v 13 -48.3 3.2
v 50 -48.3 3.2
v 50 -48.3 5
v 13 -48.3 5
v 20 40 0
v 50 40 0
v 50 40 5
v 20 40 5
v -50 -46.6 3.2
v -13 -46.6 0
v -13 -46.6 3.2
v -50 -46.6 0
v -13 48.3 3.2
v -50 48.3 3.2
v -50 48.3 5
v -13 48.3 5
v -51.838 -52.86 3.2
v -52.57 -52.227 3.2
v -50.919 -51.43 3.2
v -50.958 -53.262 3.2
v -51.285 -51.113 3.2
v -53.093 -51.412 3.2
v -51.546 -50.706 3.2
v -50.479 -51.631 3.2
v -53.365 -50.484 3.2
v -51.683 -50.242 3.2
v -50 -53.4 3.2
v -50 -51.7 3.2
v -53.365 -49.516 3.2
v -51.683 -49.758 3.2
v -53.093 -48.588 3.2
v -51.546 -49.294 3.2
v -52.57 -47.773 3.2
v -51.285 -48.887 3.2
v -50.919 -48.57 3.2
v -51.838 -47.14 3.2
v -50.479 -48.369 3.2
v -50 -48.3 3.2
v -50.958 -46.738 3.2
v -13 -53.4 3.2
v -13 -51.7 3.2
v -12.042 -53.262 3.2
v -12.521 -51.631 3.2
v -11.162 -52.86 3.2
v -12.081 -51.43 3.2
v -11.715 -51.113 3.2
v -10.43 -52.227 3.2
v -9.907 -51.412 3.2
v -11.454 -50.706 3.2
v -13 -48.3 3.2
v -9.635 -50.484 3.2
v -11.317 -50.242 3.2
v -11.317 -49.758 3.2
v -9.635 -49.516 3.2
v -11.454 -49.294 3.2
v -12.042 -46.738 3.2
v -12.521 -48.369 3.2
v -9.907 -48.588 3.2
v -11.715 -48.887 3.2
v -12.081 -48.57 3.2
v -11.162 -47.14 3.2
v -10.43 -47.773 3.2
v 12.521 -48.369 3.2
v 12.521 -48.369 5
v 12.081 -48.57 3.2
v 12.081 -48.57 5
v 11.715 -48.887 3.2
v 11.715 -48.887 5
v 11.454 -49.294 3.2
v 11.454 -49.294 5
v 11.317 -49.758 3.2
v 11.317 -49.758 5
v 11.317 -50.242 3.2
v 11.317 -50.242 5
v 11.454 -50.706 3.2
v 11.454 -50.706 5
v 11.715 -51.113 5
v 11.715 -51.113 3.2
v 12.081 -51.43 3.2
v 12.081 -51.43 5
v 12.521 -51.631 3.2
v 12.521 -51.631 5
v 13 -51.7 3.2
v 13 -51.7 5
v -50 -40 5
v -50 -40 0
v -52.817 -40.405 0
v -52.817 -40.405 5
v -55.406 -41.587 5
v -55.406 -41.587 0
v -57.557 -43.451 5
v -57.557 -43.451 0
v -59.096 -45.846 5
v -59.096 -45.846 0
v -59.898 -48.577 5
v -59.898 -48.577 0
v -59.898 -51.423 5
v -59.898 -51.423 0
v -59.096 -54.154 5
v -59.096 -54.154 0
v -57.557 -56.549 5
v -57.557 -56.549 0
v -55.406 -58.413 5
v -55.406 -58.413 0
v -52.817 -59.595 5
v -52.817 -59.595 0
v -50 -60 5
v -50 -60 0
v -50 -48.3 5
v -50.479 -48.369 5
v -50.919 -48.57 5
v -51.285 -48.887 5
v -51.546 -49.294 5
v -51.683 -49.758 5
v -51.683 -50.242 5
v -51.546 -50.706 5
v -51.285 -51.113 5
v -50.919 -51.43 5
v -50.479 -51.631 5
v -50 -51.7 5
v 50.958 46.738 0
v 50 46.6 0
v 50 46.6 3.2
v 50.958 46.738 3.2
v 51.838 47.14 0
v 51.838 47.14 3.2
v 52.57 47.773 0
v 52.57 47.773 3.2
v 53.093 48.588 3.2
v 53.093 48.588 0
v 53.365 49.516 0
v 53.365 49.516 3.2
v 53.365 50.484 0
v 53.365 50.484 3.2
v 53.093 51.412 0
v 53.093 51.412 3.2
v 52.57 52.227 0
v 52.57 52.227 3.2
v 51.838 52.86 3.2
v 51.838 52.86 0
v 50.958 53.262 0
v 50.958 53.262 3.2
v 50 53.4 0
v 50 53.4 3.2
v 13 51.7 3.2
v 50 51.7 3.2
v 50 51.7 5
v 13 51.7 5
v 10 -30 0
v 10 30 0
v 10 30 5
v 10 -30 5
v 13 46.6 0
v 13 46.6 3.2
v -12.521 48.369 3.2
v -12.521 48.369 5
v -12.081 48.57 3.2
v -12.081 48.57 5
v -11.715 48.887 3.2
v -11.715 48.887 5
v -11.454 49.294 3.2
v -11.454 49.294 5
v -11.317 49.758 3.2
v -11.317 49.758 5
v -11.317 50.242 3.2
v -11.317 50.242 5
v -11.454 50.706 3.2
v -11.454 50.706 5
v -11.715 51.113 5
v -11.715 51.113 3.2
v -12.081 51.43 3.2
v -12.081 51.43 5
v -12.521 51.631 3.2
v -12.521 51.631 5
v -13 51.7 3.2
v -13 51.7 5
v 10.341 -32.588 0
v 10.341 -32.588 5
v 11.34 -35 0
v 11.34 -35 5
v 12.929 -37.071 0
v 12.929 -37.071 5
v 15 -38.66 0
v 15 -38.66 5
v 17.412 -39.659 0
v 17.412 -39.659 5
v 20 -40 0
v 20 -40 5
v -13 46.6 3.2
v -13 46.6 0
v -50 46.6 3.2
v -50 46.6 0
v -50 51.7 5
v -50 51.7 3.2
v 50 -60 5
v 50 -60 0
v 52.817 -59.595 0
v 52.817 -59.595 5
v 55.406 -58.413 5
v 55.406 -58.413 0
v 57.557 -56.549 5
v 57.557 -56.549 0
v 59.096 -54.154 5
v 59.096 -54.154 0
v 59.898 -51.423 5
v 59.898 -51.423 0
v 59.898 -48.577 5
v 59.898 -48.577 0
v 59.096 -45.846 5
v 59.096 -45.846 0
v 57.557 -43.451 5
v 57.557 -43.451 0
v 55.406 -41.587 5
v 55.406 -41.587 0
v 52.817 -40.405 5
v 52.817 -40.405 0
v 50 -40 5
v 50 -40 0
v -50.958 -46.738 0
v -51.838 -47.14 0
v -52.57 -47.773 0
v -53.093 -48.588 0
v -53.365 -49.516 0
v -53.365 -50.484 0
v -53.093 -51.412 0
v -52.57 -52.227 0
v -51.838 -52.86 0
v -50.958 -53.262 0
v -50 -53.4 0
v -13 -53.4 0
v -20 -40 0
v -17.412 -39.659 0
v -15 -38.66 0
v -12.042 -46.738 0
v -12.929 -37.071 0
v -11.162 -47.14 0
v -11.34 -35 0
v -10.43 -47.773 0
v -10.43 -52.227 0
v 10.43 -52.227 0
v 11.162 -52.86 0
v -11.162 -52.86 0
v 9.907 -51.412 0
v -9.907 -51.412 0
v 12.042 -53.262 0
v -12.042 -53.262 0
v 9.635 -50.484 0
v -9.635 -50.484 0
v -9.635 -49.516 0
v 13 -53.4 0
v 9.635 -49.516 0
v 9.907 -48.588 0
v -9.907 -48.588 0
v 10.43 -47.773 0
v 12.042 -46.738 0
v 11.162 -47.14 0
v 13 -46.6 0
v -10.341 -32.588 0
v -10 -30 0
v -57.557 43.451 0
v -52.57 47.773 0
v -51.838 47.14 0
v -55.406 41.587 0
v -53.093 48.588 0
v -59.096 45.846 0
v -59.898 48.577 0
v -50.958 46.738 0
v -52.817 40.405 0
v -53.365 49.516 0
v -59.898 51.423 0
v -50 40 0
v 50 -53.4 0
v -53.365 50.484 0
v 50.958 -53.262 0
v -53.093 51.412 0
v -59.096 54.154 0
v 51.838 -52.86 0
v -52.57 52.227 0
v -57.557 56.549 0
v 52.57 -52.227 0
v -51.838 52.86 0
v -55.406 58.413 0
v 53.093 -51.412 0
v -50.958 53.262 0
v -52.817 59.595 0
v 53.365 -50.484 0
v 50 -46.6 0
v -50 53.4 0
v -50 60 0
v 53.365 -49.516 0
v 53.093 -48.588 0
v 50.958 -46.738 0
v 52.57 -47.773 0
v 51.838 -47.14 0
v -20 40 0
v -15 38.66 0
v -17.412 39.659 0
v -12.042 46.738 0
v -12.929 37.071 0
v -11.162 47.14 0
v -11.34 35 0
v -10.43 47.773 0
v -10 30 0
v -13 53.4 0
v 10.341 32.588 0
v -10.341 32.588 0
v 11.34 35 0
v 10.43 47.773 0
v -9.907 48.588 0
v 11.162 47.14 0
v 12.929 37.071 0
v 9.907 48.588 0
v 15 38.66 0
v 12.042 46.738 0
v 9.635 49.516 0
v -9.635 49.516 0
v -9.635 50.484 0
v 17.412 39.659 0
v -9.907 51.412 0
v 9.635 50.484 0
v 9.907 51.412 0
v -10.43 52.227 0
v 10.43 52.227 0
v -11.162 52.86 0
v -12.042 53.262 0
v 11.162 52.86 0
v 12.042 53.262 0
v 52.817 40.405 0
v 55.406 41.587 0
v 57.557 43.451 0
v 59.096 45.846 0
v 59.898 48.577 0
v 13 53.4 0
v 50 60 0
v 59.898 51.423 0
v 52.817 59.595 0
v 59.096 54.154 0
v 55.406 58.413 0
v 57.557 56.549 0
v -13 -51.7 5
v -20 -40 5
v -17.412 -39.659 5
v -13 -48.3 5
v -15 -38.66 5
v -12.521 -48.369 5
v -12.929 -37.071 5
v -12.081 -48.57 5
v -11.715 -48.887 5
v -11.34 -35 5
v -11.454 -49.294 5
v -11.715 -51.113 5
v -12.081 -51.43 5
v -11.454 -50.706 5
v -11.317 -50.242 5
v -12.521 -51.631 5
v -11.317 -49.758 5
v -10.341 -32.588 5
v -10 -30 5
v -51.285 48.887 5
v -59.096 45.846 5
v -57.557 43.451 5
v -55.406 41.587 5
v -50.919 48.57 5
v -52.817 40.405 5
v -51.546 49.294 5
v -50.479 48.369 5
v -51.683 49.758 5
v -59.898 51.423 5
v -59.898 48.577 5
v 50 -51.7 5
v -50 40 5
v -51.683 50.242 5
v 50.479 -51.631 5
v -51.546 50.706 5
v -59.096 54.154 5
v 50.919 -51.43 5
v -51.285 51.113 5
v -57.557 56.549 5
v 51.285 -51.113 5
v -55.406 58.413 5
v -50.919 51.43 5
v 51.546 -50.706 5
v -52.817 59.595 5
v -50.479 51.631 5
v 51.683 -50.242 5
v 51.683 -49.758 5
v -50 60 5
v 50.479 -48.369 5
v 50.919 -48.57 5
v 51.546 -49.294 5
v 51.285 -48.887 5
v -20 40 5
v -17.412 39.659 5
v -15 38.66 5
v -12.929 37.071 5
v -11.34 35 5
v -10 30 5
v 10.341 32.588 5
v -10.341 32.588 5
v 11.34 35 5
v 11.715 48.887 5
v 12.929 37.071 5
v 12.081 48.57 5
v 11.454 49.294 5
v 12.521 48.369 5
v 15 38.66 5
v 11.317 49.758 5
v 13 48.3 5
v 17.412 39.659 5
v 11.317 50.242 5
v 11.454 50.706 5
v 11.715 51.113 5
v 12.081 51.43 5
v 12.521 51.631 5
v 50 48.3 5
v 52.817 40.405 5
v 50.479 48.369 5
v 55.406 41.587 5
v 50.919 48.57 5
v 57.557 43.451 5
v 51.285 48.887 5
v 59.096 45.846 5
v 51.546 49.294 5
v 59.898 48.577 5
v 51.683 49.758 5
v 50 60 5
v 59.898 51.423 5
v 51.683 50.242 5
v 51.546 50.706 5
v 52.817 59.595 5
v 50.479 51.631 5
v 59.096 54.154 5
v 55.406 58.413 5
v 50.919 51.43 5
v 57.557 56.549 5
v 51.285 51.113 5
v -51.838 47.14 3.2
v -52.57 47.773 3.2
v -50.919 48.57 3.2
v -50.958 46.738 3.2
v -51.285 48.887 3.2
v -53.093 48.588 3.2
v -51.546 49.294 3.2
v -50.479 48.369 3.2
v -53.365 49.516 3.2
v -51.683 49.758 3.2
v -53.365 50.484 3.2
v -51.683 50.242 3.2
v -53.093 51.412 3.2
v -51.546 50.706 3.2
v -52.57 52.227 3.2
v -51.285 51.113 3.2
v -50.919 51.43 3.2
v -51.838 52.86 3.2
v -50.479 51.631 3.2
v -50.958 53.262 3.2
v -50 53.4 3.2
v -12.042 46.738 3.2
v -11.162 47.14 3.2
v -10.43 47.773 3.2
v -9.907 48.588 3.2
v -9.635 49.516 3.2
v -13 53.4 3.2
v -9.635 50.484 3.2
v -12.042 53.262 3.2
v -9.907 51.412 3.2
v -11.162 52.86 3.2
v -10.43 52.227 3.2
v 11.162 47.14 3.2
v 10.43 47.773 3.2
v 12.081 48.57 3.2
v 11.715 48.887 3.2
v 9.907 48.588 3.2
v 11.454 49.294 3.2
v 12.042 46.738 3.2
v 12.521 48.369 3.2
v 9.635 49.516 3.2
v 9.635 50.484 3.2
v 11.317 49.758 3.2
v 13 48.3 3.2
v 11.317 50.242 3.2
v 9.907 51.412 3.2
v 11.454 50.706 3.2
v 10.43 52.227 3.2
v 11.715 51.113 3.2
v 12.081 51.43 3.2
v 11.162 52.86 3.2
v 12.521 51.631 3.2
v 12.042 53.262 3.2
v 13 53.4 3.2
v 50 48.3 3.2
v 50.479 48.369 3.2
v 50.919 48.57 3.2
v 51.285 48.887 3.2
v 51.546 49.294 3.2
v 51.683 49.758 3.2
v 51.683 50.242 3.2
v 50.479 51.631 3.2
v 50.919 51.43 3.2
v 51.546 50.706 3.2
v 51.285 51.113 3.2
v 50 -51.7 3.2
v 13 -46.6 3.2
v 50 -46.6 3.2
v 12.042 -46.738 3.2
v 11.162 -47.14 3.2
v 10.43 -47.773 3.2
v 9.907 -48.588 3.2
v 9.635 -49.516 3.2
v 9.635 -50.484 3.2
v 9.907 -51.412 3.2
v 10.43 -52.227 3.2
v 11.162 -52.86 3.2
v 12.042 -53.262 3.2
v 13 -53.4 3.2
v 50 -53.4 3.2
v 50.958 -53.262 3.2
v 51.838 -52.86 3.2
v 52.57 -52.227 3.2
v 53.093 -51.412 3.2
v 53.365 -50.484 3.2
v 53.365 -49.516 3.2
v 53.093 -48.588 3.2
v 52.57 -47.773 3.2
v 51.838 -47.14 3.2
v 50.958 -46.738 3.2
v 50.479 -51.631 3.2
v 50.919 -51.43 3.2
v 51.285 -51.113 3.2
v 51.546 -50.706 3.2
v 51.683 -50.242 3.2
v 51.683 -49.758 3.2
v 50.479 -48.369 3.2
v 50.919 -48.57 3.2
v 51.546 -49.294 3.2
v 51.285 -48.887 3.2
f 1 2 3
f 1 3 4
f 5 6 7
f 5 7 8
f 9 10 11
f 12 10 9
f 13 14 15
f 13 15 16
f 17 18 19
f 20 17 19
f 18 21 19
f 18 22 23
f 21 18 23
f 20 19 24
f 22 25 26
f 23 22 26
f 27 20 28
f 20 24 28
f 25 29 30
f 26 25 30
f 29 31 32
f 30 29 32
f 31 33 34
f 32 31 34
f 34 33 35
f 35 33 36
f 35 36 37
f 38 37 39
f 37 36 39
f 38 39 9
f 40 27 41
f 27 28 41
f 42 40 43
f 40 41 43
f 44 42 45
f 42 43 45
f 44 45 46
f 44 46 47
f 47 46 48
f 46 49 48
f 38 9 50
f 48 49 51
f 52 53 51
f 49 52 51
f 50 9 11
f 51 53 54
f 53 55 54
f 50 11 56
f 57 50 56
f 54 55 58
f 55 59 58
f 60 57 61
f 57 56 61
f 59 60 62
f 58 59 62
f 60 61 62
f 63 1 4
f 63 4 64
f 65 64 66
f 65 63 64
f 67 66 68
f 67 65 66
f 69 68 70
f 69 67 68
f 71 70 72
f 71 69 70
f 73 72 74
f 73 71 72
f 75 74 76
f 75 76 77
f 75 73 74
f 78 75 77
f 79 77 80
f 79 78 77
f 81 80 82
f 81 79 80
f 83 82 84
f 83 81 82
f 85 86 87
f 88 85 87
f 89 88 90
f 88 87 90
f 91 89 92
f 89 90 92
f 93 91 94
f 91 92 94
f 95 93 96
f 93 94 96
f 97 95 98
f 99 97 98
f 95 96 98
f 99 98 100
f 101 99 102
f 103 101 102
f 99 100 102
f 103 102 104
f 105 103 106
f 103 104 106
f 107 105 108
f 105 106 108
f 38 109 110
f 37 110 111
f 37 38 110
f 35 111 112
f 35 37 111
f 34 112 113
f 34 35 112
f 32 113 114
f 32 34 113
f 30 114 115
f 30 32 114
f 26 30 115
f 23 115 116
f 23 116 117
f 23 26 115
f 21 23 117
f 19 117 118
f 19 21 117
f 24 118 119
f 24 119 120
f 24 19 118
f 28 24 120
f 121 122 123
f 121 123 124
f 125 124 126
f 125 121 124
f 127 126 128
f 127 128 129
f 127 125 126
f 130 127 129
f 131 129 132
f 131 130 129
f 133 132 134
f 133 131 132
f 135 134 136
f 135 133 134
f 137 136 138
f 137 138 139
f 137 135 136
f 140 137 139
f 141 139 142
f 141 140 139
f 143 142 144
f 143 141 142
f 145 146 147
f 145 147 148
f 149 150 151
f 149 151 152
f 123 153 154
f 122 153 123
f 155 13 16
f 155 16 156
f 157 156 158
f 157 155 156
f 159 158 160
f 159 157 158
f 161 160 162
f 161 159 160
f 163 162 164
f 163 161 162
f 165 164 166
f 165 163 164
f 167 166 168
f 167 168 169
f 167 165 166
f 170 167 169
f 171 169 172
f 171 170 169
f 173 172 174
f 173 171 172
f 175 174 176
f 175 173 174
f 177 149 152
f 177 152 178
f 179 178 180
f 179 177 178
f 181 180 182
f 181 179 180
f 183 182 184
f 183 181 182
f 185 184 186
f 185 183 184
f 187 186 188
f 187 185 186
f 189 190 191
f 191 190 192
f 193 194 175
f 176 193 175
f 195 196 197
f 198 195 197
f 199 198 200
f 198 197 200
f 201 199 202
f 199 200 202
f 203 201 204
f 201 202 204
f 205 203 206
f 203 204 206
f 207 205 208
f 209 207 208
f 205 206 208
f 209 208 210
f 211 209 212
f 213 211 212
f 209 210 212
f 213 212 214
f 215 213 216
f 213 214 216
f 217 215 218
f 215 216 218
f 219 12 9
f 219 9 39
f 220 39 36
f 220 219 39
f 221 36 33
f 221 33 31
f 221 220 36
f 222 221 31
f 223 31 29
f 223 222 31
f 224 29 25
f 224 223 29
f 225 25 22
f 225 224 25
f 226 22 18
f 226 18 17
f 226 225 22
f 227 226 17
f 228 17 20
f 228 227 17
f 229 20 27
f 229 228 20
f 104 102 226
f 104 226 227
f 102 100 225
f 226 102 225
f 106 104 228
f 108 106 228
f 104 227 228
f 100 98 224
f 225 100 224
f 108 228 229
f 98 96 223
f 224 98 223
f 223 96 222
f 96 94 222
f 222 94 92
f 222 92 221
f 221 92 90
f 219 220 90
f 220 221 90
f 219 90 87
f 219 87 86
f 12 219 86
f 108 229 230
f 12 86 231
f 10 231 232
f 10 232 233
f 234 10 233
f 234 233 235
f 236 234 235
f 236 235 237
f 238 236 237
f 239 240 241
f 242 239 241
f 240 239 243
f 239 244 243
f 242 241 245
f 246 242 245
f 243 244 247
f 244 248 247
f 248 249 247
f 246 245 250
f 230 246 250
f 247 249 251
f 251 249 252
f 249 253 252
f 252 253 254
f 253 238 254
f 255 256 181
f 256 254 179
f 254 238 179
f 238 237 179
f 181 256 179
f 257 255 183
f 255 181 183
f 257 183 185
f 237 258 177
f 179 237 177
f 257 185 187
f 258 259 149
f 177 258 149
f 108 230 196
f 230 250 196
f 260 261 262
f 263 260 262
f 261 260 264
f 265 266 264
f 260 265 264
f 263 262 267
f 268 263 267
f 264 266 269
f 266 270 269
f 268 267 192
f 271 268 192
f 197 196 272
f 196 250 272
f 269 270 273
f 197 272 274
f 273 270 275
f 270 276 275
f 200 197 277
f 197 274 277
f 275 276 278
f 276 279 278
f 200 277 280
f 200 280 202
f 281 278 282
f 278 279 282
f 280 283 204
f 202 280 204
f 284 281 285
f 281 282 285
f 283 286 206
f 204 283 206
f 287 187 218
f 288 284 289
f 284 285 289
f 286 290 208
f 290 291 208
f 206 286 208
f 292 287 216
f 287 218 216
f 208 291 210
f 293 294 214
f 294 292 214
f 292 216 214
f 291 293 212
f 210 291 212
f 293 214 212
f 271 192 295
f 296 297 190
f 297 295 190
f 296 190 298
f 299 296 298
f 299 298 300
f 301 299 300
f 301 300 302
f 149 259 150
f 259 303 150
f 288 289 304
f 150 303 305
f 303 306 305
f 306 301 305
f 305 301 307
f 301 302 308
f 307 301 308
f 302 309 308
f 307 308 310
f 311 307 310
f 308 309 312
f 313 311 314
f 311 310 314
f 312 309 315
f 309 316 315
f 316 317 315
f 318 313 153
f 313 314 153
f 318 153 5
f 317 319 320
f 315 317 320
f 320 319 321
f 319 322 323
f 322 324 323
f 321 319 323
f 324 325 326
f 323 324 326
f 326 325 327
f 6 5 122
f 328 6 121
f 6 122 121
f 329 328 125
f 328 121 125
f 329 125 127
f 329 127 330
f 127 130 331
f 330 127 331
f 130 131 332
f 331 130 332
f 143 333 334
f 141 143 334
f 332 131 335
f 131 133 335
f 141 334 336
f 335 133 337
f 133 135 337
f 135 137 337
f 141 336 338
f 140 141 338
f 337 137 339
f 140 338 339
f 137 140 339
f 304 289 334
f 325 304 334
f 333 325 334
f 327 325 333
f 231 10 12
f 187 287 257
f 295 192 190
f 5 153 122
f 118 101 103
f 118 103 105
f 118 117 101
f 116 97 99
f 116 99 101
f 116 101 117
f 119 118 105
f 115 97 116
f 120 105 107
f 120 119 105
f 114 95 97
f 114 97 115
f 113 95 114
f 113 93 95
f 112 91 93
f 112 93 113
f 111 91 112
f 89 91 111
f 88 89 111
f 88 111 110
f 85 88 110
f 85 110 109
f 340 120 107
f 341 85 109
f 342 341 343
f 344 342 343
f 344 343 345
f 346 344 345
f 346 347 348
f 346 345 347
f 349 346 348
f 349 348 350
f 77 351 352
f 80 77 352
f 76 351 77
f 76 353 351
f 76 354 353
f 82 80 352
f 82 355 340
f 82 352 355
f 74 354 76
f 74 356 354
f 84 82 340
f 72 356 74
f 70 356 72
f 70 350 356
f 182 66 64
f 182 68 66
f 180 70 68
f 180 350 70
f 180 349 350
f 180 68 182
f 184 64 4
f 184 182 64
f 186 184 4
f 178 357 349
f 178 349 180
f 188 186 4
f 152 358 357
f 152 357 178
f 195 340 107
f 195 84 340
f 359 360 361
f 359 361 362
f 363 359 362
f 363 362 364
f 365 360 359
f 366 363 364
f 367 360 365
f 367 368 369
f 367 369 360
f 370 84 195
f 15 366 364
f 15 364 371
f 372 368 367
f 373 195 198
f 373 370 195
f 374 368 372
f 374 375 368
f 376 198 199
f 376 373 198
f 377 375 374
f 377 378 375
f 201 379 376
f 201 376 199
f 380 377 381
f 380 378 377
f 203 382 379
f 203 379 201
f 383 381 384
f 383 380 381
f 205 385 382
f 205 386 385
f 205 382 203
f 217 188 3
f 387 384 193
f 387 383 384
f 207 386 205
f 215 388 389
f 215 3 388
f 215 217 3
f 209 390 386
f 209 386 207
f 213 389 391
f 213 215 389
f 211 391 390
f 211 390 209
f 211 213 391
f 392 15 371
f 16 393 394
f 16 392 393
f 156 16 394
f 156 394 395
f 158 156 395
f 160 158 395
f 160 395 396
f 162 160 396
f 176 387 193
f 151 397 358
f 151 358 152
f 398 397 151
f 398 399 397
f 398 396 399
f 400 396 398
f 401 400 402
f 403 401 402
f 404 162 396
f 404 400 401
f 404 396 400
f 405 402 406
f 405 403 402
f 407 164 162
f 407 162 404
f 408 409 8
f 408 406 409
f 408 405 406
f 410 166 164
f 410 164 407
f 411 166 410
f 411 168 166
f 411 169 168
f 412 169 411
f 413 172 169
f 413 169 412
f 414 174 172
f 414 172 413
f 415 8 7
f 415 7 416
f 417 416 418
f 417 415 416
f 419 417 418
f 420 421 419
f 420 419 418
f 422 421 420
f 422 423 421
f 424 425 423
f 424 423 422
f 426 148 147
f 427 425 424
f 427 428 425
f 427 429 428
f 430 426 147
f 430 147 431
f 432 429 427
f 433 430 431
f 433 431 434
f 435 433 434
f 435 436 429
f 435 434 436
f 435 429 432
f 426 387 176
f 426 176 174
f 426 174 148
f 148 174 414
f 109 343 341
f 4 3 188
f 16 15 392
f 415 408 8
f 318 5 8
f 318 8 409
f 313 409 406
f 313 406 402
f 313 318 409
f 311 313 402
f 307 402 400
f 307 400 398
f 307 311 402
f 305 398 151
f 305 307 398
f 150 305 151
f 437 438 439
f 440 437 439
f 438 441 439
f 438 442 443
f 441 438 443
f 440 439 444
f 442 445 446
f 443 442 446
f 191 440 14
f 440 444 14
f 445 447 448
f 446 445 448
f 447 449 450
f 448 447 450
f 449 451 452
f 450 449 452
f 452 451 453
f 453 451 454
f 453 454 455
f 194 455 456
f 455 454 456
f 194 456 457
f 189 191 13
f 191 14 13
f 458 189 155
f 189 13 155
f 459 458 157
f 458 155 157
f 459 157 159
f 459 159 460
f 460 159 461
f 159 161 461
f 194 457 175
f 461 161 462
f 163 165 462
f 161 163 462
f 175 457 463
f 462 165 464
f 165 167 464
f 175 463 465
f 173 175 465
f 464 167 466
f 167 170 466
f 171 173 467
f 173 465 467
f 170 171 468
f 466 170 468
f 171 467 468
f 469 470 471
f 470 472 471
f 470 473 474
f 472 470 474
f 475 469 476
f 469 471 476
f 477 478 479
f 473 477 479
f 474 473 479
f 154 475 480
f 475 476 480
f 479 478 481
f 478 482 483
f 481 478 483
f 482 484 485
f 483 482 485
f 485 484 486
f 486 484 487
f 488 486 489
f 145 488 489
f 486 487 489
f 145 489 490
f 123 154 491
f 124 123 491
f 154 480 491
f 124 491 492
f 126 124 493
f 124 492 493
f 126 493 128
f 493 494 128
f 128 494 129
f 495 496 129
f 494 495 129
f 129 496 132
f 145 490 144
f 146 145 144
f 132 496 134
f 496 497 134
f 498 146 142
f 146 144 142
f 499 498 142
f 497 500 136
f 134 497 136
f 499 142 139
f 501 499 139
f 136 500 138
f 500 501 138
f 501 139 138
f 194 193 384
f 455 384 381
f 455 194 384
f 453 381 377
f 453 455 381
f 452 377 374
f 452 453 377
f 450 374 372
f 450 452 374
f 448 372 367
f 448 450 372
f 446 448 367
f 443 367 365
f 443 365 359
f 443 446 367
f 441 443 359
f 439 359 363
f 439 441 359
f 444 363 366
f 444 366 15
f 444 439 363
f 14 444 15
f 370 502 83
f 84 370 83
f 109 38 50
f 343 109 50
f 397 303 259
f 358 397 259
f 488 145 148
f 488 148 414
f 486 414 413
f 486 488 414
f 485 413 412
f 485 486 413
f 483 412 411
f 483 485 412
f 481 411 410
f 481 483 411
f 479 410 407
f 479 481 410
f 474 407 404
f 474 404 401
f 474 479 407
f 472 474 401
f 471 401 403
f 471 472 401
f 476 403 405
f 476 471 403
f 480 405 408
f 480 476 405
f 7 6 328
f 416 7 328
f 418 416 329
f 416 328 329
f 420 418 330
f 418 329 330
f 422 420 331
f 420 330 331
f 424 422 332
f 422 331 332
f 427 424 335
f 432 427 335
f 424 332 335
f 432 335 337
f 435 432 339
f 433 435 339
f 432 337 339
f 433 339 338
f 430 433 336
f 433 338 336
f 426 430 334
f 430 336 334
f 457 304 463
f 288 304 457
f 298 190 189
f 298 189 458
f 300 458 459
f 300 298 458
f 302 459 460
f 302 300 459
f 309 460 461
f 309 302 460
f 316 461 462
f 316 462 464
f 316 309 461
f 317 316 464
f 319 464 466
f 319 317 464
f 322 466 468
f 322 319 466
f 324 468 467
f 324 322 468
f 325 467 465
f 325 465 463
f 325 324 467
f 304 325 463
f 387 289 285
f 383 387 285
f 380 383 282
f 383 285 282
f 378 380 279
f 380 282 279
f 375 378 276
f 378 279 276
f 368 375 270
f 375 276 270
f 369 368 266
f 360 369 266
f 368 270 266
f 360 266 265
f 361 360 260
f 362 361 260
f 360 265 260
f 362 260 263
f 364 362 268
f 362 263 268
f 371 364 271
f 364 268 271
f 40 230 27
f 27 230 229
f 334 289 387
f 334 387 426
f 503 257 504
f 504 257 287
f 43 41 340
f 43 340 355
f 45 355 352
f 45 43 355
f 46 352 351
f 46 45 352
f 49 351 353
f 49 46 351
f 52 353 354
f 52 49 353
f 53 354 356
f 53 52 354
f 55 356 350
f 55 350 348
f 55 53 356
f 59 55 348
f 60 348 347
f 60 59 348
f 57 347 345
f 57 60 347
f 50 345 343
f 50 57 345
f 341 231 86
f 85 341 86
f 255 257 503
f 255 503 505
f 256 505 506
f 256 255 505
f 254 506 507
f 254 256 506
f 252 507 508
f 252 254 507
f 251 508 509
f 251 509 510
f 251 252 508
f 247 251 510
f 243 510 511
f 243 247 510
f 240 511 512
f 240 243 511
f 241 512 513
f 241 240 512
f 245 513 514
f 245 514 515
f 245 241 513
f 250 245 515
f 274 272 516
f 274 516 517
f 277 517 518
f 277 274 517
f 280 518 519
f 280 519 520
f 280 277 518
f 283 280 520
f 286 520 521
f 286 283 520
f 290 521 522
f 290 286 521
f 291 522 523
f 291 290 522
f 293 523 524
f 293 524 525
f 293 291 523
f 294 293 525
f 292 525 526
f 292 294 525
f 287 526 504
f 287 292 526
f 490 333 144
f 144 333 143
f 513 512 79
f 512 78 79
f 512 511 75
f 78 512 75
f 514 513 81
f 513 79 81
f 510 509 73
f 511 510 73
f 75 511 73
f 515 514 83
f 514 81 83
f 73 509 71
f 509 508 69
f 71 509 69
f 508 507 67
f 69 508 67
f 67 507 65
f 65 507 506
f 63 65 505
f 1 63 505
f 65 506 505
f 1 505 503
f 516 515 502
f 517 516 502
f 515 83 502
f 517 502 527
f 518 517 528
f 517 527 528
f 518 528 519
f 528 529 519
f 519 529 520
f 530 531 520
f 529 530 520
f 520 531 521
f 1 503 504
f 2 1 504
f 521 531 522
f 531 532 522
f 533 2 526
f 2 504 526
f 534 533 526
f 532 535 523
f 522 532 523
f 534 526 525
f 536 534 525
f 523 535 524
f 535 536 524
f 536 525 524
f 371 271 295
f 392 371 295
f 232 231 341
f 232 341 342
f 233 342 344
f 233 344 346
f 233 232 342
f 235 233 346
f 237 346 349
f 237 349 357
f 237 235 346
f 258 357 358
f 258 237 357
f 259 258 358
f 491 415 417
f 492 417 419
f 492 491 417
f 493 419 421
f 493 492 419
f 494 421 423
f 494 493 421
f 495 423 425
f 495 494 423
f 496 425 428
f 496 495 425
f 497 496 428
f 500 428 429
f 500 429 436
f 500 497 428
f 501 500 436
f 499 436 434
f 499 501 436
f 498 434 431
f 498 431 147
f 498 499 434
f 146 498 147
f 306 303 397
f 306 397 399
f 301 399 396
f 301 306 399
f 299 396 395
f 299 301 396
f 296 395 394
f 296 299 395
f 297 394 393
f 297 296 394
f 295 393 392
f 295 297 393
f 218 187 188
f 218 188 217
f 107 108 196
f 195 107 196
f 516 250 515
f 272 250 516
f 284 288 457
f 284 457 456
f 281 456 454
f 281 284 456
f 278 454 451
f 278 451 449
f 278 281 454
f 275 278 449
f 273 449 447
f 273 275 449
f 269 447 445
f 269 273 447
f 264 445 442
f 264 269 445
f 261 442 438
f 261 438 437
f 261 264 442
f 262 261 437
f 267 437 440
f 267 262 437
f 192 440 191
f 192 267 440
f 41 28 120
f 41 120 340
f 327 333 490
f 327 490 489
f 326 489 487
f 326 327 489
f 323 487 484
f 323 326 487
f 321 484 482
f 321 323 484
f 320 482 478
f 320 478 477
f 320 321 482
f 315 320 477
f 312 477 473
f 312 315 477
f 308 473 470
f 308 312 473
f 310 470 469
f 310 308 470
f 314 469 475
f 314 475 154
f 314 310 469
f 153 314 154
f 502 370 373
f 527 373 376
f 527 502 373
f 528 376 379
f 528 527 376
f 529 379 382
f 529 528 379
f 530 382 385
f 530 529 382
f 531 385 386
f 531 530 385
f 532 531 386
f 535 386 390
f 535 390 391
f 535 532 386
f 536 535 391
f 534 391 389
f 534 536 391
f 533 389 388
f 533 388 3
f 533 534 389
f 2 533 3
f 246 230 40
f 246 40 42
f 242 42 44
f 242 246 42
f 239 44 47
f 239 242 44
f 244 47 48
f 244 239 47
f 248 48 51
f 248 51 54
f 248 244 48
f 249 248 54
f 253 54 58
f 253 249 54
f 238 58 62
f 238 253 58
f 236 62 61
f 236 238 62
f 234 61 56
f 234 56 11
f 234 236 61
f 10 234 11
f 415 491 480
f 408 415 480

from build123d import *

# Parameters (mm, degrees)
PAD_DEPTH    = 5
POCKET_DEPTH = 3.2


with BuildPart() as part:
    # Sketch → Pad (new body)
    with BuildSketch(Plane.XY):
        with BuildLine():
            ThreePointArc((-50, -40), (-60, -50), (-50, -60))
            Line((-50, -60), (50, -60))
            ThreePointArc((50, -60), (60, -50), (50, -40))
            Line((20, -40), (50, -40))
            ThreePointArc((10, -30), (12.928932, -37.071068), (20, -40))
            Line((10, 30), (10, -30))
            ThreePointArc((20, 40), (12.928932, 37.071068), (10, 30))
            Line((50, 40), (20, 40))
            ThreePointArc((50, 40), (60, 50), (50, 60))
            Line((-50, 60), (50, 60))
            ThreePointArc((-50, 60), (-60, 50), (-50, 40))
            Line((-50, 40), (-20, 40))
            ThreePointArc((-10, 30), (-12.928932, 37.071068), (-20, 40))
            Line((-10, 30), (-10, -30))
            ThreePointArc((-20, -40), (-12.928932, -37.071068), (-10, -30))
            Line((-20, -40), (-50, -40))
        make_face()
        with BuildLine():
            ThreePointArc((-50, -48.3), (-51.7, -50), (-50, -51.7))
            Line((-50, -51.7), (-13, -51.7))
            ThreePointArc((-13, -51.7), (-11.3, -50), (-13, -48.3))
            Line((-50, -48.3), (-13, -48.3))
        make_face(mode=Mode.SUBTRACT)
        with BuildLine():
            ThreePointArc((50, -51.7), (51.7, -50), (50, -48.3))
            Line((50, -48.3), (13, -48.3))
            ThreePointArc((13, -48.3), (11.3, -50), (13, -51.7))
            Line((50, -51.7), (13, -51.7))
        make_face(mode=Mode.SUBTRACT)
        with BuildLine():
            ThreePointArc((-50, 51.7), (-51.7, 50), (-50, 48.3))
            Line((-50, 48.3), (-13, 48.3))
            ThreePointArc((-13, 48.3), (-11.3, 50), (-13, 51.7))
            Line((-50, 51.7), (-13, 51.7))
        make_face(mode=Mode.SUBTRACT)
        with BuildLine():
            ThreePointArc((50, 48.3), (51.7, 50), (50, 51.7))
            Line((50, 51.7), (13, 51.7))
            ThreePointArc((13, 51.7), (11.3, 50), (13, 48.3))
            Line((50, 48.3), (13, 48.3))
        make_face(mode=Mode.SUBTRACT)
    extrude(amount=PAD_DEPTH)

    # Sketch001 → Pocket (cut)
    with BuildSketch(Plane.XY):
        with BuildLine():
            ThreePointArc((-13, -53.4), (-9.6, -50), (-13, -46.6))
            Line((-13, -46.6), (-50, -46.6))
            ThreePointArc((-50, -46.6), (-53.4, -50), (-50, -53.4))
            Line((-13, -53.4), (-50, -53.4))
        make_face()
        with BuildLine():
            ThreePointArc((13, -46.6), (9.6, -50), (13, -53.4))
            Line((13, -53.4), (50, -53.4))
            ThreePointArc((50, -53.4), (53.4, -50), (50, -46.6))
            Line((13, -46.6), (50, -46.6))
        make_face()
        with BuildLine():
            ThreePointArc((-13, 46.6), (-9.6, 50), (-13, 53.4))
            Line((-13, 53.4), (-50, 53.4))
            ThreePointArc((-50, 53.4), (-53.4, 50), (-50, 46.6))
            Line((-13, 46.6), (-50, 46.6))
        make_face()
        with BuildLine():
            ThreePointArc((13, 53.4), (9.6, 50), (13, 46.6))
            Line((13, 46.6), (50, 46.6))
            ThreePointArc((50, 46.6), (53.4, 50), (50, 53.4))
            Line((13, 53.4), (50, 53.4))
        make_face()
    extrude(amount=POCKET_DEPTH, mode=Mode.SUBTRACT)


solid = part.part
